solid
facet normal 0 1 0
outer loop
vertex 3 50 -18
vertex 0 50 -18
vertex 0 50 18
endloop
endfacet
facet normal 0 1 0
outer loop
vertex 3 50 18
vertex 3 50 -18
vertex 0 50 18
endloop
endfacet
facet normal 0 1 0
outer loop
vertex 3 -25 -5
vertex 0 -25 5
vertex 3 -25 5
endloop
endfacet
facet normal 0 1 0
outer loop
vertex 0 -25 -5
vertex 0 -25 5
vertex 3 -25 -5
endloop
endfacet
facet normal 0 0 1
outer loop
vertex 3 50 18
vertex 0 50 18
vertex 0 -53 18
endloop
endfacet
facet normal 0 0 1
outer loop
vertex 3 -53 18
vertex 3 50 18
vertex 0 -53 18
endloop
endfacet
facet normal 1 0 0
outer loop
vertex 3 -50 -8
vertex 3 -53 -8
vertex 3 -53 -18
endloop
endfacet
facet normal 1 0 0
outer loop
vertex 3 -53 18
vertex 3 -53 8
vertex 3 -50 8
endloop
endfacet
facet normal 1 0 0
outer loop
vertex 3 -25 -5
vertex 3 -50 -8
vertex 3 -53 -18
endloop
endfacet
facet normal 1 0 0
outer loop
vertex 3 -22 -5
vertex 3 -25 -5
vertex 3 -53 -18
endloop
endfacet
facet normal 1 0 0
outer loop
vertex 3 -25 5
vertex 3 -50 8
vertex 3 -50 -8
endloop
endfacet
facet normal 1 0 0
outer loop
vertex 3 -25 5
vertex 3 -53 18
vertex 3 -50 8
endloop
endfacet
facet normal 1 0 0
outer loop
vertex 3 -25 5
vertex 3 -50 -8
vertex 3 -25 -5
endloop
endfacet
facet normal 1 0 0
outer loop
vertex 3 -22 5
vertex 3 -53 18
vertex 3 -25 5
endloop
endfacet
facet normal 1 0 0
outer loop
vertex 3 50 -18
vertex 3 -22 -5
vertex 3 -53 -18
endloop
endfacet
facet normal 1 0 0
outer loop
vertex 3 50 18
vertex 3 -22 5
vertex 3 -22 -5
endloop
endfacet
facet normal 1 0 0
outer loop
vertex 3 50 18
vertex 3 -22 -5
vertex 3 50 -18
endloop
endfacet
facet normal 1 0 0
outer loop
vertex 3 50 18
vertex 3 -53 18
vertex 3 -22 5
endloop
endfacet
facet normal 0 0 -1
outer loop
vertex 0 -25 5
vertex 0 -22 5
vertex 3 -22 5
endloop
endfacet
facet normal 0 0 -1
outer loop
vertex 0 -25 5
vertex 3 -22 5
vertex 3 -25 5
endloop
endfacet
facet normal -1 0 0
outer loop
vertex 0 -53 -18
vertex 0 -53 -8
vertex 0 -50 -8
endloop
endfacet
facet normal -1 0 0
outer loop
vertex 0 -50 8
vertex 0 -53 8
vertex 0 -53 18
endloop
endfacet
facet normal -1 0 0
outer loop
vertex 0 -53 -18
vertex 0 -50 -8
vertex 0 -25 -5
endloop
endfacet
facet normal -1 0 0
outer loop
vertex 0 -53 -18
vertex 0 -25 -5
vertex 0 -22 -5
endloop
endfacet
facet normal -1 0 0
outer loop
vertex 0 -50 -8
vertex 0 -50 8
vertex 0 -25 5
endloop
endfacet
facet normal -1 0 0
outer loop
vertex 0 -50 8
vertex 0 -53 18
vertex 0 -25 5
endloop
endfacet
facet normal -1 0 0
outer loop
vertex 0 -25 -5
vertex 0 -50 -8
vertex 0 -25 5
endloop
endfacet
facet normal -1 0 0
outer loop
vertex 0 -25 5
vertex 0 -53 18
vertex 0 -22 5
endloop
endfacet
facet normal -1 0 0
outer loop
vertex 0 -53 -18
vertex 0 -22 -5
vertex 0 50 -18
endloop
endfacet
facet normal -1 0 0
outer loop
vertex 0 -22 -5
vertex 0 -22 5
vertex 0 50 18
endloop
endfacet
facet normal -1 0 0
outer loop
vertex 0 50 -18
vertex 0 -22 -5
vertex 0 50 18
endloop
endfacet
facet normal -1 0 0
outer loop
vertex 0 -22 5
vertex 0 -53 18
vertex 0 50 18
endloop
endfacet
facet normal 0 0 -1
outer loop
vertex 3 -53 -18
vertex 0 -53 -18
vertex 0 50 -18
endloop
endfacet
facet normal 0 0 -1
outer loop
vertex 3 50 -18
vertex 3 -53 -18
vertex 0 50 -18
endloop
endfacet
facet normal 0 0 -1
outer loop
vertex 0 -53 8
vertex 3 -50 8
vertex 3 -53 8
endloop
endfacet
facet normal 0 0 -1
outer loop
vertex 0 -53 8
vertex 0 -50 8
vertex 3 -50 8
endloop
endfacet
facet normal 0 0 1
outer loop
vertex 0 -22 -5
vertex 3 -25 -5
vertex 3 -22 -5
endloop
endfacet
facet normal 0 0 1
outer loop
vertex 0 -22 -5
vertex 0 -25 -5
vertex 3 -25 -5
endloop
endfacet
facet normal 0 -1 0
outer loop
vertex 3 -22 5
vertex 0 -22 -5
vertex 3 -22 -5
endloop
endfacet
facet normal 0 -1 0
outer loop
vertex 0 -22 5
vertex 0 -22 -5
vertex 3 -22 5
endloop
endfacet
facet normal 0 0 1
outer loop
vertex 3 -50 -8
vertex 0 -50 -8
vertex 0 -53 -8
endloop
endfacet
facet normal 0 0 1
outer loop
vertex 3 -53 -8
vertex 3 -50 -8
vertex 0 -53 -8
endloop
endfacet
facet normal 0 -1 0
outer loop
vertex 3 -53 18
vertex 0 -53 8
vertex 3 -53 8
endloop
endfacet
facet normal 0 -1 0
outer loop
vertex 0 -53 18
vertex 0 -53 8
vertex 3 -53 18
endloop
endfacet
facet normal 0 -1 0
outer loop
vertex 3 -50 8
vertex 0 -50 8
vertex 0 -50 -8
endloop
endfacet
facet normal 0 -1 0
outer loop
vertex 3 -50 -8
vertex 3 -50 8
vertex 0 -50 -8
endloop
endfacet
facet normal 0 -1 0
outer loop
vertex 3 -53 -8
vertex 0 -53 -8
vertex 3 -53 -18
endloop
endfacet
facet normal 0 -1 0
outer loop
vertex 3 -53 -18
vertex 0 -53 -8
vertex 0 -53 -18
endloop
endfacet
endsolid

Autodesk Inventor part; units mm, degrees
ref_plane "YZ Plane" through (0, 0, 0) normal (1, 0, 0) x (0, 1, 0)
ref_plane "XZ Plane" through (0, 0, 0) normal (0, 1, 0) x (-1, 0, 0)
ref_plane "XY Plane" through (0, 0, 0) normal (0, 0, 1) x (1, 0, 0)
sketch "Sketch1" plane through (0, 0, 0) normal (1, 0, 0) x (0, 1, 0)
  line L0 (-50, -18) -> (50, -18)
  line L1 (50, -18) -> (50, 18)
  line L2 (50, 18) -> (-50, 18)
  line L3 (-50, 18) -> (-50, -18)
  line L4 (-50, -18) -> (50, 18) construction
  line L5 (50, -18) -> (-50, 18) construction
  point P0 (0, 0)
  dimension "d0" = 36
  dimension "d1" = 100
extrude "Extrusion1" add sketch "Sketch1" along normal blind 3
sketch "Sketch2" plane through (0, 0, 0) normal (-1, 0, 0) x (0, 0, 1)
  line L0 (-5, -22) -> (5, -22)
  line L1 (5, -22) -> (5, -25)
  line L2 (5, -25) -> (-5, -25)
  line L3 (-5, -25) -> (-5, -22)
  line L4 (18, -50) -> (-18, -50) projected
  point P0 (0, 0)
  point P1 (0, -22)
  dimension "d4" = 10
  dimension "d5" = 3
  dimension "d6" = 25
extrude "Extrusion2" cut sketch "Sketch2" against normal blind 3
sketch "Sketch3" plane through (0, 0, 0) normal (-1, 0, 0) x (0, 0, 1)
  line L0 (-18, -50) -> (-8, -50)
  line L1 (-8, -50) -> (-8, -53)
  line L2 (-8, -53) -> (-18, -53)
  line L3 (-18, -53) -> (-18, -50)
  line L4 (18, -50) -> (8, -50)
  line L5 (8, -50) -> (8, -53)
  line L6 (8, -53) -> (18, -53)
  line L7 (18, -53) -> (18, -50)
  point P0 (0, 0)
  dimension "d9" = 10
  dimension "d10" = 3
  dimension "d11" = 10
  dimension "d12" = 3
extrude "Extrusion3" add sketch "Sketch3" against normal blind 3
properties part number "Back support"
